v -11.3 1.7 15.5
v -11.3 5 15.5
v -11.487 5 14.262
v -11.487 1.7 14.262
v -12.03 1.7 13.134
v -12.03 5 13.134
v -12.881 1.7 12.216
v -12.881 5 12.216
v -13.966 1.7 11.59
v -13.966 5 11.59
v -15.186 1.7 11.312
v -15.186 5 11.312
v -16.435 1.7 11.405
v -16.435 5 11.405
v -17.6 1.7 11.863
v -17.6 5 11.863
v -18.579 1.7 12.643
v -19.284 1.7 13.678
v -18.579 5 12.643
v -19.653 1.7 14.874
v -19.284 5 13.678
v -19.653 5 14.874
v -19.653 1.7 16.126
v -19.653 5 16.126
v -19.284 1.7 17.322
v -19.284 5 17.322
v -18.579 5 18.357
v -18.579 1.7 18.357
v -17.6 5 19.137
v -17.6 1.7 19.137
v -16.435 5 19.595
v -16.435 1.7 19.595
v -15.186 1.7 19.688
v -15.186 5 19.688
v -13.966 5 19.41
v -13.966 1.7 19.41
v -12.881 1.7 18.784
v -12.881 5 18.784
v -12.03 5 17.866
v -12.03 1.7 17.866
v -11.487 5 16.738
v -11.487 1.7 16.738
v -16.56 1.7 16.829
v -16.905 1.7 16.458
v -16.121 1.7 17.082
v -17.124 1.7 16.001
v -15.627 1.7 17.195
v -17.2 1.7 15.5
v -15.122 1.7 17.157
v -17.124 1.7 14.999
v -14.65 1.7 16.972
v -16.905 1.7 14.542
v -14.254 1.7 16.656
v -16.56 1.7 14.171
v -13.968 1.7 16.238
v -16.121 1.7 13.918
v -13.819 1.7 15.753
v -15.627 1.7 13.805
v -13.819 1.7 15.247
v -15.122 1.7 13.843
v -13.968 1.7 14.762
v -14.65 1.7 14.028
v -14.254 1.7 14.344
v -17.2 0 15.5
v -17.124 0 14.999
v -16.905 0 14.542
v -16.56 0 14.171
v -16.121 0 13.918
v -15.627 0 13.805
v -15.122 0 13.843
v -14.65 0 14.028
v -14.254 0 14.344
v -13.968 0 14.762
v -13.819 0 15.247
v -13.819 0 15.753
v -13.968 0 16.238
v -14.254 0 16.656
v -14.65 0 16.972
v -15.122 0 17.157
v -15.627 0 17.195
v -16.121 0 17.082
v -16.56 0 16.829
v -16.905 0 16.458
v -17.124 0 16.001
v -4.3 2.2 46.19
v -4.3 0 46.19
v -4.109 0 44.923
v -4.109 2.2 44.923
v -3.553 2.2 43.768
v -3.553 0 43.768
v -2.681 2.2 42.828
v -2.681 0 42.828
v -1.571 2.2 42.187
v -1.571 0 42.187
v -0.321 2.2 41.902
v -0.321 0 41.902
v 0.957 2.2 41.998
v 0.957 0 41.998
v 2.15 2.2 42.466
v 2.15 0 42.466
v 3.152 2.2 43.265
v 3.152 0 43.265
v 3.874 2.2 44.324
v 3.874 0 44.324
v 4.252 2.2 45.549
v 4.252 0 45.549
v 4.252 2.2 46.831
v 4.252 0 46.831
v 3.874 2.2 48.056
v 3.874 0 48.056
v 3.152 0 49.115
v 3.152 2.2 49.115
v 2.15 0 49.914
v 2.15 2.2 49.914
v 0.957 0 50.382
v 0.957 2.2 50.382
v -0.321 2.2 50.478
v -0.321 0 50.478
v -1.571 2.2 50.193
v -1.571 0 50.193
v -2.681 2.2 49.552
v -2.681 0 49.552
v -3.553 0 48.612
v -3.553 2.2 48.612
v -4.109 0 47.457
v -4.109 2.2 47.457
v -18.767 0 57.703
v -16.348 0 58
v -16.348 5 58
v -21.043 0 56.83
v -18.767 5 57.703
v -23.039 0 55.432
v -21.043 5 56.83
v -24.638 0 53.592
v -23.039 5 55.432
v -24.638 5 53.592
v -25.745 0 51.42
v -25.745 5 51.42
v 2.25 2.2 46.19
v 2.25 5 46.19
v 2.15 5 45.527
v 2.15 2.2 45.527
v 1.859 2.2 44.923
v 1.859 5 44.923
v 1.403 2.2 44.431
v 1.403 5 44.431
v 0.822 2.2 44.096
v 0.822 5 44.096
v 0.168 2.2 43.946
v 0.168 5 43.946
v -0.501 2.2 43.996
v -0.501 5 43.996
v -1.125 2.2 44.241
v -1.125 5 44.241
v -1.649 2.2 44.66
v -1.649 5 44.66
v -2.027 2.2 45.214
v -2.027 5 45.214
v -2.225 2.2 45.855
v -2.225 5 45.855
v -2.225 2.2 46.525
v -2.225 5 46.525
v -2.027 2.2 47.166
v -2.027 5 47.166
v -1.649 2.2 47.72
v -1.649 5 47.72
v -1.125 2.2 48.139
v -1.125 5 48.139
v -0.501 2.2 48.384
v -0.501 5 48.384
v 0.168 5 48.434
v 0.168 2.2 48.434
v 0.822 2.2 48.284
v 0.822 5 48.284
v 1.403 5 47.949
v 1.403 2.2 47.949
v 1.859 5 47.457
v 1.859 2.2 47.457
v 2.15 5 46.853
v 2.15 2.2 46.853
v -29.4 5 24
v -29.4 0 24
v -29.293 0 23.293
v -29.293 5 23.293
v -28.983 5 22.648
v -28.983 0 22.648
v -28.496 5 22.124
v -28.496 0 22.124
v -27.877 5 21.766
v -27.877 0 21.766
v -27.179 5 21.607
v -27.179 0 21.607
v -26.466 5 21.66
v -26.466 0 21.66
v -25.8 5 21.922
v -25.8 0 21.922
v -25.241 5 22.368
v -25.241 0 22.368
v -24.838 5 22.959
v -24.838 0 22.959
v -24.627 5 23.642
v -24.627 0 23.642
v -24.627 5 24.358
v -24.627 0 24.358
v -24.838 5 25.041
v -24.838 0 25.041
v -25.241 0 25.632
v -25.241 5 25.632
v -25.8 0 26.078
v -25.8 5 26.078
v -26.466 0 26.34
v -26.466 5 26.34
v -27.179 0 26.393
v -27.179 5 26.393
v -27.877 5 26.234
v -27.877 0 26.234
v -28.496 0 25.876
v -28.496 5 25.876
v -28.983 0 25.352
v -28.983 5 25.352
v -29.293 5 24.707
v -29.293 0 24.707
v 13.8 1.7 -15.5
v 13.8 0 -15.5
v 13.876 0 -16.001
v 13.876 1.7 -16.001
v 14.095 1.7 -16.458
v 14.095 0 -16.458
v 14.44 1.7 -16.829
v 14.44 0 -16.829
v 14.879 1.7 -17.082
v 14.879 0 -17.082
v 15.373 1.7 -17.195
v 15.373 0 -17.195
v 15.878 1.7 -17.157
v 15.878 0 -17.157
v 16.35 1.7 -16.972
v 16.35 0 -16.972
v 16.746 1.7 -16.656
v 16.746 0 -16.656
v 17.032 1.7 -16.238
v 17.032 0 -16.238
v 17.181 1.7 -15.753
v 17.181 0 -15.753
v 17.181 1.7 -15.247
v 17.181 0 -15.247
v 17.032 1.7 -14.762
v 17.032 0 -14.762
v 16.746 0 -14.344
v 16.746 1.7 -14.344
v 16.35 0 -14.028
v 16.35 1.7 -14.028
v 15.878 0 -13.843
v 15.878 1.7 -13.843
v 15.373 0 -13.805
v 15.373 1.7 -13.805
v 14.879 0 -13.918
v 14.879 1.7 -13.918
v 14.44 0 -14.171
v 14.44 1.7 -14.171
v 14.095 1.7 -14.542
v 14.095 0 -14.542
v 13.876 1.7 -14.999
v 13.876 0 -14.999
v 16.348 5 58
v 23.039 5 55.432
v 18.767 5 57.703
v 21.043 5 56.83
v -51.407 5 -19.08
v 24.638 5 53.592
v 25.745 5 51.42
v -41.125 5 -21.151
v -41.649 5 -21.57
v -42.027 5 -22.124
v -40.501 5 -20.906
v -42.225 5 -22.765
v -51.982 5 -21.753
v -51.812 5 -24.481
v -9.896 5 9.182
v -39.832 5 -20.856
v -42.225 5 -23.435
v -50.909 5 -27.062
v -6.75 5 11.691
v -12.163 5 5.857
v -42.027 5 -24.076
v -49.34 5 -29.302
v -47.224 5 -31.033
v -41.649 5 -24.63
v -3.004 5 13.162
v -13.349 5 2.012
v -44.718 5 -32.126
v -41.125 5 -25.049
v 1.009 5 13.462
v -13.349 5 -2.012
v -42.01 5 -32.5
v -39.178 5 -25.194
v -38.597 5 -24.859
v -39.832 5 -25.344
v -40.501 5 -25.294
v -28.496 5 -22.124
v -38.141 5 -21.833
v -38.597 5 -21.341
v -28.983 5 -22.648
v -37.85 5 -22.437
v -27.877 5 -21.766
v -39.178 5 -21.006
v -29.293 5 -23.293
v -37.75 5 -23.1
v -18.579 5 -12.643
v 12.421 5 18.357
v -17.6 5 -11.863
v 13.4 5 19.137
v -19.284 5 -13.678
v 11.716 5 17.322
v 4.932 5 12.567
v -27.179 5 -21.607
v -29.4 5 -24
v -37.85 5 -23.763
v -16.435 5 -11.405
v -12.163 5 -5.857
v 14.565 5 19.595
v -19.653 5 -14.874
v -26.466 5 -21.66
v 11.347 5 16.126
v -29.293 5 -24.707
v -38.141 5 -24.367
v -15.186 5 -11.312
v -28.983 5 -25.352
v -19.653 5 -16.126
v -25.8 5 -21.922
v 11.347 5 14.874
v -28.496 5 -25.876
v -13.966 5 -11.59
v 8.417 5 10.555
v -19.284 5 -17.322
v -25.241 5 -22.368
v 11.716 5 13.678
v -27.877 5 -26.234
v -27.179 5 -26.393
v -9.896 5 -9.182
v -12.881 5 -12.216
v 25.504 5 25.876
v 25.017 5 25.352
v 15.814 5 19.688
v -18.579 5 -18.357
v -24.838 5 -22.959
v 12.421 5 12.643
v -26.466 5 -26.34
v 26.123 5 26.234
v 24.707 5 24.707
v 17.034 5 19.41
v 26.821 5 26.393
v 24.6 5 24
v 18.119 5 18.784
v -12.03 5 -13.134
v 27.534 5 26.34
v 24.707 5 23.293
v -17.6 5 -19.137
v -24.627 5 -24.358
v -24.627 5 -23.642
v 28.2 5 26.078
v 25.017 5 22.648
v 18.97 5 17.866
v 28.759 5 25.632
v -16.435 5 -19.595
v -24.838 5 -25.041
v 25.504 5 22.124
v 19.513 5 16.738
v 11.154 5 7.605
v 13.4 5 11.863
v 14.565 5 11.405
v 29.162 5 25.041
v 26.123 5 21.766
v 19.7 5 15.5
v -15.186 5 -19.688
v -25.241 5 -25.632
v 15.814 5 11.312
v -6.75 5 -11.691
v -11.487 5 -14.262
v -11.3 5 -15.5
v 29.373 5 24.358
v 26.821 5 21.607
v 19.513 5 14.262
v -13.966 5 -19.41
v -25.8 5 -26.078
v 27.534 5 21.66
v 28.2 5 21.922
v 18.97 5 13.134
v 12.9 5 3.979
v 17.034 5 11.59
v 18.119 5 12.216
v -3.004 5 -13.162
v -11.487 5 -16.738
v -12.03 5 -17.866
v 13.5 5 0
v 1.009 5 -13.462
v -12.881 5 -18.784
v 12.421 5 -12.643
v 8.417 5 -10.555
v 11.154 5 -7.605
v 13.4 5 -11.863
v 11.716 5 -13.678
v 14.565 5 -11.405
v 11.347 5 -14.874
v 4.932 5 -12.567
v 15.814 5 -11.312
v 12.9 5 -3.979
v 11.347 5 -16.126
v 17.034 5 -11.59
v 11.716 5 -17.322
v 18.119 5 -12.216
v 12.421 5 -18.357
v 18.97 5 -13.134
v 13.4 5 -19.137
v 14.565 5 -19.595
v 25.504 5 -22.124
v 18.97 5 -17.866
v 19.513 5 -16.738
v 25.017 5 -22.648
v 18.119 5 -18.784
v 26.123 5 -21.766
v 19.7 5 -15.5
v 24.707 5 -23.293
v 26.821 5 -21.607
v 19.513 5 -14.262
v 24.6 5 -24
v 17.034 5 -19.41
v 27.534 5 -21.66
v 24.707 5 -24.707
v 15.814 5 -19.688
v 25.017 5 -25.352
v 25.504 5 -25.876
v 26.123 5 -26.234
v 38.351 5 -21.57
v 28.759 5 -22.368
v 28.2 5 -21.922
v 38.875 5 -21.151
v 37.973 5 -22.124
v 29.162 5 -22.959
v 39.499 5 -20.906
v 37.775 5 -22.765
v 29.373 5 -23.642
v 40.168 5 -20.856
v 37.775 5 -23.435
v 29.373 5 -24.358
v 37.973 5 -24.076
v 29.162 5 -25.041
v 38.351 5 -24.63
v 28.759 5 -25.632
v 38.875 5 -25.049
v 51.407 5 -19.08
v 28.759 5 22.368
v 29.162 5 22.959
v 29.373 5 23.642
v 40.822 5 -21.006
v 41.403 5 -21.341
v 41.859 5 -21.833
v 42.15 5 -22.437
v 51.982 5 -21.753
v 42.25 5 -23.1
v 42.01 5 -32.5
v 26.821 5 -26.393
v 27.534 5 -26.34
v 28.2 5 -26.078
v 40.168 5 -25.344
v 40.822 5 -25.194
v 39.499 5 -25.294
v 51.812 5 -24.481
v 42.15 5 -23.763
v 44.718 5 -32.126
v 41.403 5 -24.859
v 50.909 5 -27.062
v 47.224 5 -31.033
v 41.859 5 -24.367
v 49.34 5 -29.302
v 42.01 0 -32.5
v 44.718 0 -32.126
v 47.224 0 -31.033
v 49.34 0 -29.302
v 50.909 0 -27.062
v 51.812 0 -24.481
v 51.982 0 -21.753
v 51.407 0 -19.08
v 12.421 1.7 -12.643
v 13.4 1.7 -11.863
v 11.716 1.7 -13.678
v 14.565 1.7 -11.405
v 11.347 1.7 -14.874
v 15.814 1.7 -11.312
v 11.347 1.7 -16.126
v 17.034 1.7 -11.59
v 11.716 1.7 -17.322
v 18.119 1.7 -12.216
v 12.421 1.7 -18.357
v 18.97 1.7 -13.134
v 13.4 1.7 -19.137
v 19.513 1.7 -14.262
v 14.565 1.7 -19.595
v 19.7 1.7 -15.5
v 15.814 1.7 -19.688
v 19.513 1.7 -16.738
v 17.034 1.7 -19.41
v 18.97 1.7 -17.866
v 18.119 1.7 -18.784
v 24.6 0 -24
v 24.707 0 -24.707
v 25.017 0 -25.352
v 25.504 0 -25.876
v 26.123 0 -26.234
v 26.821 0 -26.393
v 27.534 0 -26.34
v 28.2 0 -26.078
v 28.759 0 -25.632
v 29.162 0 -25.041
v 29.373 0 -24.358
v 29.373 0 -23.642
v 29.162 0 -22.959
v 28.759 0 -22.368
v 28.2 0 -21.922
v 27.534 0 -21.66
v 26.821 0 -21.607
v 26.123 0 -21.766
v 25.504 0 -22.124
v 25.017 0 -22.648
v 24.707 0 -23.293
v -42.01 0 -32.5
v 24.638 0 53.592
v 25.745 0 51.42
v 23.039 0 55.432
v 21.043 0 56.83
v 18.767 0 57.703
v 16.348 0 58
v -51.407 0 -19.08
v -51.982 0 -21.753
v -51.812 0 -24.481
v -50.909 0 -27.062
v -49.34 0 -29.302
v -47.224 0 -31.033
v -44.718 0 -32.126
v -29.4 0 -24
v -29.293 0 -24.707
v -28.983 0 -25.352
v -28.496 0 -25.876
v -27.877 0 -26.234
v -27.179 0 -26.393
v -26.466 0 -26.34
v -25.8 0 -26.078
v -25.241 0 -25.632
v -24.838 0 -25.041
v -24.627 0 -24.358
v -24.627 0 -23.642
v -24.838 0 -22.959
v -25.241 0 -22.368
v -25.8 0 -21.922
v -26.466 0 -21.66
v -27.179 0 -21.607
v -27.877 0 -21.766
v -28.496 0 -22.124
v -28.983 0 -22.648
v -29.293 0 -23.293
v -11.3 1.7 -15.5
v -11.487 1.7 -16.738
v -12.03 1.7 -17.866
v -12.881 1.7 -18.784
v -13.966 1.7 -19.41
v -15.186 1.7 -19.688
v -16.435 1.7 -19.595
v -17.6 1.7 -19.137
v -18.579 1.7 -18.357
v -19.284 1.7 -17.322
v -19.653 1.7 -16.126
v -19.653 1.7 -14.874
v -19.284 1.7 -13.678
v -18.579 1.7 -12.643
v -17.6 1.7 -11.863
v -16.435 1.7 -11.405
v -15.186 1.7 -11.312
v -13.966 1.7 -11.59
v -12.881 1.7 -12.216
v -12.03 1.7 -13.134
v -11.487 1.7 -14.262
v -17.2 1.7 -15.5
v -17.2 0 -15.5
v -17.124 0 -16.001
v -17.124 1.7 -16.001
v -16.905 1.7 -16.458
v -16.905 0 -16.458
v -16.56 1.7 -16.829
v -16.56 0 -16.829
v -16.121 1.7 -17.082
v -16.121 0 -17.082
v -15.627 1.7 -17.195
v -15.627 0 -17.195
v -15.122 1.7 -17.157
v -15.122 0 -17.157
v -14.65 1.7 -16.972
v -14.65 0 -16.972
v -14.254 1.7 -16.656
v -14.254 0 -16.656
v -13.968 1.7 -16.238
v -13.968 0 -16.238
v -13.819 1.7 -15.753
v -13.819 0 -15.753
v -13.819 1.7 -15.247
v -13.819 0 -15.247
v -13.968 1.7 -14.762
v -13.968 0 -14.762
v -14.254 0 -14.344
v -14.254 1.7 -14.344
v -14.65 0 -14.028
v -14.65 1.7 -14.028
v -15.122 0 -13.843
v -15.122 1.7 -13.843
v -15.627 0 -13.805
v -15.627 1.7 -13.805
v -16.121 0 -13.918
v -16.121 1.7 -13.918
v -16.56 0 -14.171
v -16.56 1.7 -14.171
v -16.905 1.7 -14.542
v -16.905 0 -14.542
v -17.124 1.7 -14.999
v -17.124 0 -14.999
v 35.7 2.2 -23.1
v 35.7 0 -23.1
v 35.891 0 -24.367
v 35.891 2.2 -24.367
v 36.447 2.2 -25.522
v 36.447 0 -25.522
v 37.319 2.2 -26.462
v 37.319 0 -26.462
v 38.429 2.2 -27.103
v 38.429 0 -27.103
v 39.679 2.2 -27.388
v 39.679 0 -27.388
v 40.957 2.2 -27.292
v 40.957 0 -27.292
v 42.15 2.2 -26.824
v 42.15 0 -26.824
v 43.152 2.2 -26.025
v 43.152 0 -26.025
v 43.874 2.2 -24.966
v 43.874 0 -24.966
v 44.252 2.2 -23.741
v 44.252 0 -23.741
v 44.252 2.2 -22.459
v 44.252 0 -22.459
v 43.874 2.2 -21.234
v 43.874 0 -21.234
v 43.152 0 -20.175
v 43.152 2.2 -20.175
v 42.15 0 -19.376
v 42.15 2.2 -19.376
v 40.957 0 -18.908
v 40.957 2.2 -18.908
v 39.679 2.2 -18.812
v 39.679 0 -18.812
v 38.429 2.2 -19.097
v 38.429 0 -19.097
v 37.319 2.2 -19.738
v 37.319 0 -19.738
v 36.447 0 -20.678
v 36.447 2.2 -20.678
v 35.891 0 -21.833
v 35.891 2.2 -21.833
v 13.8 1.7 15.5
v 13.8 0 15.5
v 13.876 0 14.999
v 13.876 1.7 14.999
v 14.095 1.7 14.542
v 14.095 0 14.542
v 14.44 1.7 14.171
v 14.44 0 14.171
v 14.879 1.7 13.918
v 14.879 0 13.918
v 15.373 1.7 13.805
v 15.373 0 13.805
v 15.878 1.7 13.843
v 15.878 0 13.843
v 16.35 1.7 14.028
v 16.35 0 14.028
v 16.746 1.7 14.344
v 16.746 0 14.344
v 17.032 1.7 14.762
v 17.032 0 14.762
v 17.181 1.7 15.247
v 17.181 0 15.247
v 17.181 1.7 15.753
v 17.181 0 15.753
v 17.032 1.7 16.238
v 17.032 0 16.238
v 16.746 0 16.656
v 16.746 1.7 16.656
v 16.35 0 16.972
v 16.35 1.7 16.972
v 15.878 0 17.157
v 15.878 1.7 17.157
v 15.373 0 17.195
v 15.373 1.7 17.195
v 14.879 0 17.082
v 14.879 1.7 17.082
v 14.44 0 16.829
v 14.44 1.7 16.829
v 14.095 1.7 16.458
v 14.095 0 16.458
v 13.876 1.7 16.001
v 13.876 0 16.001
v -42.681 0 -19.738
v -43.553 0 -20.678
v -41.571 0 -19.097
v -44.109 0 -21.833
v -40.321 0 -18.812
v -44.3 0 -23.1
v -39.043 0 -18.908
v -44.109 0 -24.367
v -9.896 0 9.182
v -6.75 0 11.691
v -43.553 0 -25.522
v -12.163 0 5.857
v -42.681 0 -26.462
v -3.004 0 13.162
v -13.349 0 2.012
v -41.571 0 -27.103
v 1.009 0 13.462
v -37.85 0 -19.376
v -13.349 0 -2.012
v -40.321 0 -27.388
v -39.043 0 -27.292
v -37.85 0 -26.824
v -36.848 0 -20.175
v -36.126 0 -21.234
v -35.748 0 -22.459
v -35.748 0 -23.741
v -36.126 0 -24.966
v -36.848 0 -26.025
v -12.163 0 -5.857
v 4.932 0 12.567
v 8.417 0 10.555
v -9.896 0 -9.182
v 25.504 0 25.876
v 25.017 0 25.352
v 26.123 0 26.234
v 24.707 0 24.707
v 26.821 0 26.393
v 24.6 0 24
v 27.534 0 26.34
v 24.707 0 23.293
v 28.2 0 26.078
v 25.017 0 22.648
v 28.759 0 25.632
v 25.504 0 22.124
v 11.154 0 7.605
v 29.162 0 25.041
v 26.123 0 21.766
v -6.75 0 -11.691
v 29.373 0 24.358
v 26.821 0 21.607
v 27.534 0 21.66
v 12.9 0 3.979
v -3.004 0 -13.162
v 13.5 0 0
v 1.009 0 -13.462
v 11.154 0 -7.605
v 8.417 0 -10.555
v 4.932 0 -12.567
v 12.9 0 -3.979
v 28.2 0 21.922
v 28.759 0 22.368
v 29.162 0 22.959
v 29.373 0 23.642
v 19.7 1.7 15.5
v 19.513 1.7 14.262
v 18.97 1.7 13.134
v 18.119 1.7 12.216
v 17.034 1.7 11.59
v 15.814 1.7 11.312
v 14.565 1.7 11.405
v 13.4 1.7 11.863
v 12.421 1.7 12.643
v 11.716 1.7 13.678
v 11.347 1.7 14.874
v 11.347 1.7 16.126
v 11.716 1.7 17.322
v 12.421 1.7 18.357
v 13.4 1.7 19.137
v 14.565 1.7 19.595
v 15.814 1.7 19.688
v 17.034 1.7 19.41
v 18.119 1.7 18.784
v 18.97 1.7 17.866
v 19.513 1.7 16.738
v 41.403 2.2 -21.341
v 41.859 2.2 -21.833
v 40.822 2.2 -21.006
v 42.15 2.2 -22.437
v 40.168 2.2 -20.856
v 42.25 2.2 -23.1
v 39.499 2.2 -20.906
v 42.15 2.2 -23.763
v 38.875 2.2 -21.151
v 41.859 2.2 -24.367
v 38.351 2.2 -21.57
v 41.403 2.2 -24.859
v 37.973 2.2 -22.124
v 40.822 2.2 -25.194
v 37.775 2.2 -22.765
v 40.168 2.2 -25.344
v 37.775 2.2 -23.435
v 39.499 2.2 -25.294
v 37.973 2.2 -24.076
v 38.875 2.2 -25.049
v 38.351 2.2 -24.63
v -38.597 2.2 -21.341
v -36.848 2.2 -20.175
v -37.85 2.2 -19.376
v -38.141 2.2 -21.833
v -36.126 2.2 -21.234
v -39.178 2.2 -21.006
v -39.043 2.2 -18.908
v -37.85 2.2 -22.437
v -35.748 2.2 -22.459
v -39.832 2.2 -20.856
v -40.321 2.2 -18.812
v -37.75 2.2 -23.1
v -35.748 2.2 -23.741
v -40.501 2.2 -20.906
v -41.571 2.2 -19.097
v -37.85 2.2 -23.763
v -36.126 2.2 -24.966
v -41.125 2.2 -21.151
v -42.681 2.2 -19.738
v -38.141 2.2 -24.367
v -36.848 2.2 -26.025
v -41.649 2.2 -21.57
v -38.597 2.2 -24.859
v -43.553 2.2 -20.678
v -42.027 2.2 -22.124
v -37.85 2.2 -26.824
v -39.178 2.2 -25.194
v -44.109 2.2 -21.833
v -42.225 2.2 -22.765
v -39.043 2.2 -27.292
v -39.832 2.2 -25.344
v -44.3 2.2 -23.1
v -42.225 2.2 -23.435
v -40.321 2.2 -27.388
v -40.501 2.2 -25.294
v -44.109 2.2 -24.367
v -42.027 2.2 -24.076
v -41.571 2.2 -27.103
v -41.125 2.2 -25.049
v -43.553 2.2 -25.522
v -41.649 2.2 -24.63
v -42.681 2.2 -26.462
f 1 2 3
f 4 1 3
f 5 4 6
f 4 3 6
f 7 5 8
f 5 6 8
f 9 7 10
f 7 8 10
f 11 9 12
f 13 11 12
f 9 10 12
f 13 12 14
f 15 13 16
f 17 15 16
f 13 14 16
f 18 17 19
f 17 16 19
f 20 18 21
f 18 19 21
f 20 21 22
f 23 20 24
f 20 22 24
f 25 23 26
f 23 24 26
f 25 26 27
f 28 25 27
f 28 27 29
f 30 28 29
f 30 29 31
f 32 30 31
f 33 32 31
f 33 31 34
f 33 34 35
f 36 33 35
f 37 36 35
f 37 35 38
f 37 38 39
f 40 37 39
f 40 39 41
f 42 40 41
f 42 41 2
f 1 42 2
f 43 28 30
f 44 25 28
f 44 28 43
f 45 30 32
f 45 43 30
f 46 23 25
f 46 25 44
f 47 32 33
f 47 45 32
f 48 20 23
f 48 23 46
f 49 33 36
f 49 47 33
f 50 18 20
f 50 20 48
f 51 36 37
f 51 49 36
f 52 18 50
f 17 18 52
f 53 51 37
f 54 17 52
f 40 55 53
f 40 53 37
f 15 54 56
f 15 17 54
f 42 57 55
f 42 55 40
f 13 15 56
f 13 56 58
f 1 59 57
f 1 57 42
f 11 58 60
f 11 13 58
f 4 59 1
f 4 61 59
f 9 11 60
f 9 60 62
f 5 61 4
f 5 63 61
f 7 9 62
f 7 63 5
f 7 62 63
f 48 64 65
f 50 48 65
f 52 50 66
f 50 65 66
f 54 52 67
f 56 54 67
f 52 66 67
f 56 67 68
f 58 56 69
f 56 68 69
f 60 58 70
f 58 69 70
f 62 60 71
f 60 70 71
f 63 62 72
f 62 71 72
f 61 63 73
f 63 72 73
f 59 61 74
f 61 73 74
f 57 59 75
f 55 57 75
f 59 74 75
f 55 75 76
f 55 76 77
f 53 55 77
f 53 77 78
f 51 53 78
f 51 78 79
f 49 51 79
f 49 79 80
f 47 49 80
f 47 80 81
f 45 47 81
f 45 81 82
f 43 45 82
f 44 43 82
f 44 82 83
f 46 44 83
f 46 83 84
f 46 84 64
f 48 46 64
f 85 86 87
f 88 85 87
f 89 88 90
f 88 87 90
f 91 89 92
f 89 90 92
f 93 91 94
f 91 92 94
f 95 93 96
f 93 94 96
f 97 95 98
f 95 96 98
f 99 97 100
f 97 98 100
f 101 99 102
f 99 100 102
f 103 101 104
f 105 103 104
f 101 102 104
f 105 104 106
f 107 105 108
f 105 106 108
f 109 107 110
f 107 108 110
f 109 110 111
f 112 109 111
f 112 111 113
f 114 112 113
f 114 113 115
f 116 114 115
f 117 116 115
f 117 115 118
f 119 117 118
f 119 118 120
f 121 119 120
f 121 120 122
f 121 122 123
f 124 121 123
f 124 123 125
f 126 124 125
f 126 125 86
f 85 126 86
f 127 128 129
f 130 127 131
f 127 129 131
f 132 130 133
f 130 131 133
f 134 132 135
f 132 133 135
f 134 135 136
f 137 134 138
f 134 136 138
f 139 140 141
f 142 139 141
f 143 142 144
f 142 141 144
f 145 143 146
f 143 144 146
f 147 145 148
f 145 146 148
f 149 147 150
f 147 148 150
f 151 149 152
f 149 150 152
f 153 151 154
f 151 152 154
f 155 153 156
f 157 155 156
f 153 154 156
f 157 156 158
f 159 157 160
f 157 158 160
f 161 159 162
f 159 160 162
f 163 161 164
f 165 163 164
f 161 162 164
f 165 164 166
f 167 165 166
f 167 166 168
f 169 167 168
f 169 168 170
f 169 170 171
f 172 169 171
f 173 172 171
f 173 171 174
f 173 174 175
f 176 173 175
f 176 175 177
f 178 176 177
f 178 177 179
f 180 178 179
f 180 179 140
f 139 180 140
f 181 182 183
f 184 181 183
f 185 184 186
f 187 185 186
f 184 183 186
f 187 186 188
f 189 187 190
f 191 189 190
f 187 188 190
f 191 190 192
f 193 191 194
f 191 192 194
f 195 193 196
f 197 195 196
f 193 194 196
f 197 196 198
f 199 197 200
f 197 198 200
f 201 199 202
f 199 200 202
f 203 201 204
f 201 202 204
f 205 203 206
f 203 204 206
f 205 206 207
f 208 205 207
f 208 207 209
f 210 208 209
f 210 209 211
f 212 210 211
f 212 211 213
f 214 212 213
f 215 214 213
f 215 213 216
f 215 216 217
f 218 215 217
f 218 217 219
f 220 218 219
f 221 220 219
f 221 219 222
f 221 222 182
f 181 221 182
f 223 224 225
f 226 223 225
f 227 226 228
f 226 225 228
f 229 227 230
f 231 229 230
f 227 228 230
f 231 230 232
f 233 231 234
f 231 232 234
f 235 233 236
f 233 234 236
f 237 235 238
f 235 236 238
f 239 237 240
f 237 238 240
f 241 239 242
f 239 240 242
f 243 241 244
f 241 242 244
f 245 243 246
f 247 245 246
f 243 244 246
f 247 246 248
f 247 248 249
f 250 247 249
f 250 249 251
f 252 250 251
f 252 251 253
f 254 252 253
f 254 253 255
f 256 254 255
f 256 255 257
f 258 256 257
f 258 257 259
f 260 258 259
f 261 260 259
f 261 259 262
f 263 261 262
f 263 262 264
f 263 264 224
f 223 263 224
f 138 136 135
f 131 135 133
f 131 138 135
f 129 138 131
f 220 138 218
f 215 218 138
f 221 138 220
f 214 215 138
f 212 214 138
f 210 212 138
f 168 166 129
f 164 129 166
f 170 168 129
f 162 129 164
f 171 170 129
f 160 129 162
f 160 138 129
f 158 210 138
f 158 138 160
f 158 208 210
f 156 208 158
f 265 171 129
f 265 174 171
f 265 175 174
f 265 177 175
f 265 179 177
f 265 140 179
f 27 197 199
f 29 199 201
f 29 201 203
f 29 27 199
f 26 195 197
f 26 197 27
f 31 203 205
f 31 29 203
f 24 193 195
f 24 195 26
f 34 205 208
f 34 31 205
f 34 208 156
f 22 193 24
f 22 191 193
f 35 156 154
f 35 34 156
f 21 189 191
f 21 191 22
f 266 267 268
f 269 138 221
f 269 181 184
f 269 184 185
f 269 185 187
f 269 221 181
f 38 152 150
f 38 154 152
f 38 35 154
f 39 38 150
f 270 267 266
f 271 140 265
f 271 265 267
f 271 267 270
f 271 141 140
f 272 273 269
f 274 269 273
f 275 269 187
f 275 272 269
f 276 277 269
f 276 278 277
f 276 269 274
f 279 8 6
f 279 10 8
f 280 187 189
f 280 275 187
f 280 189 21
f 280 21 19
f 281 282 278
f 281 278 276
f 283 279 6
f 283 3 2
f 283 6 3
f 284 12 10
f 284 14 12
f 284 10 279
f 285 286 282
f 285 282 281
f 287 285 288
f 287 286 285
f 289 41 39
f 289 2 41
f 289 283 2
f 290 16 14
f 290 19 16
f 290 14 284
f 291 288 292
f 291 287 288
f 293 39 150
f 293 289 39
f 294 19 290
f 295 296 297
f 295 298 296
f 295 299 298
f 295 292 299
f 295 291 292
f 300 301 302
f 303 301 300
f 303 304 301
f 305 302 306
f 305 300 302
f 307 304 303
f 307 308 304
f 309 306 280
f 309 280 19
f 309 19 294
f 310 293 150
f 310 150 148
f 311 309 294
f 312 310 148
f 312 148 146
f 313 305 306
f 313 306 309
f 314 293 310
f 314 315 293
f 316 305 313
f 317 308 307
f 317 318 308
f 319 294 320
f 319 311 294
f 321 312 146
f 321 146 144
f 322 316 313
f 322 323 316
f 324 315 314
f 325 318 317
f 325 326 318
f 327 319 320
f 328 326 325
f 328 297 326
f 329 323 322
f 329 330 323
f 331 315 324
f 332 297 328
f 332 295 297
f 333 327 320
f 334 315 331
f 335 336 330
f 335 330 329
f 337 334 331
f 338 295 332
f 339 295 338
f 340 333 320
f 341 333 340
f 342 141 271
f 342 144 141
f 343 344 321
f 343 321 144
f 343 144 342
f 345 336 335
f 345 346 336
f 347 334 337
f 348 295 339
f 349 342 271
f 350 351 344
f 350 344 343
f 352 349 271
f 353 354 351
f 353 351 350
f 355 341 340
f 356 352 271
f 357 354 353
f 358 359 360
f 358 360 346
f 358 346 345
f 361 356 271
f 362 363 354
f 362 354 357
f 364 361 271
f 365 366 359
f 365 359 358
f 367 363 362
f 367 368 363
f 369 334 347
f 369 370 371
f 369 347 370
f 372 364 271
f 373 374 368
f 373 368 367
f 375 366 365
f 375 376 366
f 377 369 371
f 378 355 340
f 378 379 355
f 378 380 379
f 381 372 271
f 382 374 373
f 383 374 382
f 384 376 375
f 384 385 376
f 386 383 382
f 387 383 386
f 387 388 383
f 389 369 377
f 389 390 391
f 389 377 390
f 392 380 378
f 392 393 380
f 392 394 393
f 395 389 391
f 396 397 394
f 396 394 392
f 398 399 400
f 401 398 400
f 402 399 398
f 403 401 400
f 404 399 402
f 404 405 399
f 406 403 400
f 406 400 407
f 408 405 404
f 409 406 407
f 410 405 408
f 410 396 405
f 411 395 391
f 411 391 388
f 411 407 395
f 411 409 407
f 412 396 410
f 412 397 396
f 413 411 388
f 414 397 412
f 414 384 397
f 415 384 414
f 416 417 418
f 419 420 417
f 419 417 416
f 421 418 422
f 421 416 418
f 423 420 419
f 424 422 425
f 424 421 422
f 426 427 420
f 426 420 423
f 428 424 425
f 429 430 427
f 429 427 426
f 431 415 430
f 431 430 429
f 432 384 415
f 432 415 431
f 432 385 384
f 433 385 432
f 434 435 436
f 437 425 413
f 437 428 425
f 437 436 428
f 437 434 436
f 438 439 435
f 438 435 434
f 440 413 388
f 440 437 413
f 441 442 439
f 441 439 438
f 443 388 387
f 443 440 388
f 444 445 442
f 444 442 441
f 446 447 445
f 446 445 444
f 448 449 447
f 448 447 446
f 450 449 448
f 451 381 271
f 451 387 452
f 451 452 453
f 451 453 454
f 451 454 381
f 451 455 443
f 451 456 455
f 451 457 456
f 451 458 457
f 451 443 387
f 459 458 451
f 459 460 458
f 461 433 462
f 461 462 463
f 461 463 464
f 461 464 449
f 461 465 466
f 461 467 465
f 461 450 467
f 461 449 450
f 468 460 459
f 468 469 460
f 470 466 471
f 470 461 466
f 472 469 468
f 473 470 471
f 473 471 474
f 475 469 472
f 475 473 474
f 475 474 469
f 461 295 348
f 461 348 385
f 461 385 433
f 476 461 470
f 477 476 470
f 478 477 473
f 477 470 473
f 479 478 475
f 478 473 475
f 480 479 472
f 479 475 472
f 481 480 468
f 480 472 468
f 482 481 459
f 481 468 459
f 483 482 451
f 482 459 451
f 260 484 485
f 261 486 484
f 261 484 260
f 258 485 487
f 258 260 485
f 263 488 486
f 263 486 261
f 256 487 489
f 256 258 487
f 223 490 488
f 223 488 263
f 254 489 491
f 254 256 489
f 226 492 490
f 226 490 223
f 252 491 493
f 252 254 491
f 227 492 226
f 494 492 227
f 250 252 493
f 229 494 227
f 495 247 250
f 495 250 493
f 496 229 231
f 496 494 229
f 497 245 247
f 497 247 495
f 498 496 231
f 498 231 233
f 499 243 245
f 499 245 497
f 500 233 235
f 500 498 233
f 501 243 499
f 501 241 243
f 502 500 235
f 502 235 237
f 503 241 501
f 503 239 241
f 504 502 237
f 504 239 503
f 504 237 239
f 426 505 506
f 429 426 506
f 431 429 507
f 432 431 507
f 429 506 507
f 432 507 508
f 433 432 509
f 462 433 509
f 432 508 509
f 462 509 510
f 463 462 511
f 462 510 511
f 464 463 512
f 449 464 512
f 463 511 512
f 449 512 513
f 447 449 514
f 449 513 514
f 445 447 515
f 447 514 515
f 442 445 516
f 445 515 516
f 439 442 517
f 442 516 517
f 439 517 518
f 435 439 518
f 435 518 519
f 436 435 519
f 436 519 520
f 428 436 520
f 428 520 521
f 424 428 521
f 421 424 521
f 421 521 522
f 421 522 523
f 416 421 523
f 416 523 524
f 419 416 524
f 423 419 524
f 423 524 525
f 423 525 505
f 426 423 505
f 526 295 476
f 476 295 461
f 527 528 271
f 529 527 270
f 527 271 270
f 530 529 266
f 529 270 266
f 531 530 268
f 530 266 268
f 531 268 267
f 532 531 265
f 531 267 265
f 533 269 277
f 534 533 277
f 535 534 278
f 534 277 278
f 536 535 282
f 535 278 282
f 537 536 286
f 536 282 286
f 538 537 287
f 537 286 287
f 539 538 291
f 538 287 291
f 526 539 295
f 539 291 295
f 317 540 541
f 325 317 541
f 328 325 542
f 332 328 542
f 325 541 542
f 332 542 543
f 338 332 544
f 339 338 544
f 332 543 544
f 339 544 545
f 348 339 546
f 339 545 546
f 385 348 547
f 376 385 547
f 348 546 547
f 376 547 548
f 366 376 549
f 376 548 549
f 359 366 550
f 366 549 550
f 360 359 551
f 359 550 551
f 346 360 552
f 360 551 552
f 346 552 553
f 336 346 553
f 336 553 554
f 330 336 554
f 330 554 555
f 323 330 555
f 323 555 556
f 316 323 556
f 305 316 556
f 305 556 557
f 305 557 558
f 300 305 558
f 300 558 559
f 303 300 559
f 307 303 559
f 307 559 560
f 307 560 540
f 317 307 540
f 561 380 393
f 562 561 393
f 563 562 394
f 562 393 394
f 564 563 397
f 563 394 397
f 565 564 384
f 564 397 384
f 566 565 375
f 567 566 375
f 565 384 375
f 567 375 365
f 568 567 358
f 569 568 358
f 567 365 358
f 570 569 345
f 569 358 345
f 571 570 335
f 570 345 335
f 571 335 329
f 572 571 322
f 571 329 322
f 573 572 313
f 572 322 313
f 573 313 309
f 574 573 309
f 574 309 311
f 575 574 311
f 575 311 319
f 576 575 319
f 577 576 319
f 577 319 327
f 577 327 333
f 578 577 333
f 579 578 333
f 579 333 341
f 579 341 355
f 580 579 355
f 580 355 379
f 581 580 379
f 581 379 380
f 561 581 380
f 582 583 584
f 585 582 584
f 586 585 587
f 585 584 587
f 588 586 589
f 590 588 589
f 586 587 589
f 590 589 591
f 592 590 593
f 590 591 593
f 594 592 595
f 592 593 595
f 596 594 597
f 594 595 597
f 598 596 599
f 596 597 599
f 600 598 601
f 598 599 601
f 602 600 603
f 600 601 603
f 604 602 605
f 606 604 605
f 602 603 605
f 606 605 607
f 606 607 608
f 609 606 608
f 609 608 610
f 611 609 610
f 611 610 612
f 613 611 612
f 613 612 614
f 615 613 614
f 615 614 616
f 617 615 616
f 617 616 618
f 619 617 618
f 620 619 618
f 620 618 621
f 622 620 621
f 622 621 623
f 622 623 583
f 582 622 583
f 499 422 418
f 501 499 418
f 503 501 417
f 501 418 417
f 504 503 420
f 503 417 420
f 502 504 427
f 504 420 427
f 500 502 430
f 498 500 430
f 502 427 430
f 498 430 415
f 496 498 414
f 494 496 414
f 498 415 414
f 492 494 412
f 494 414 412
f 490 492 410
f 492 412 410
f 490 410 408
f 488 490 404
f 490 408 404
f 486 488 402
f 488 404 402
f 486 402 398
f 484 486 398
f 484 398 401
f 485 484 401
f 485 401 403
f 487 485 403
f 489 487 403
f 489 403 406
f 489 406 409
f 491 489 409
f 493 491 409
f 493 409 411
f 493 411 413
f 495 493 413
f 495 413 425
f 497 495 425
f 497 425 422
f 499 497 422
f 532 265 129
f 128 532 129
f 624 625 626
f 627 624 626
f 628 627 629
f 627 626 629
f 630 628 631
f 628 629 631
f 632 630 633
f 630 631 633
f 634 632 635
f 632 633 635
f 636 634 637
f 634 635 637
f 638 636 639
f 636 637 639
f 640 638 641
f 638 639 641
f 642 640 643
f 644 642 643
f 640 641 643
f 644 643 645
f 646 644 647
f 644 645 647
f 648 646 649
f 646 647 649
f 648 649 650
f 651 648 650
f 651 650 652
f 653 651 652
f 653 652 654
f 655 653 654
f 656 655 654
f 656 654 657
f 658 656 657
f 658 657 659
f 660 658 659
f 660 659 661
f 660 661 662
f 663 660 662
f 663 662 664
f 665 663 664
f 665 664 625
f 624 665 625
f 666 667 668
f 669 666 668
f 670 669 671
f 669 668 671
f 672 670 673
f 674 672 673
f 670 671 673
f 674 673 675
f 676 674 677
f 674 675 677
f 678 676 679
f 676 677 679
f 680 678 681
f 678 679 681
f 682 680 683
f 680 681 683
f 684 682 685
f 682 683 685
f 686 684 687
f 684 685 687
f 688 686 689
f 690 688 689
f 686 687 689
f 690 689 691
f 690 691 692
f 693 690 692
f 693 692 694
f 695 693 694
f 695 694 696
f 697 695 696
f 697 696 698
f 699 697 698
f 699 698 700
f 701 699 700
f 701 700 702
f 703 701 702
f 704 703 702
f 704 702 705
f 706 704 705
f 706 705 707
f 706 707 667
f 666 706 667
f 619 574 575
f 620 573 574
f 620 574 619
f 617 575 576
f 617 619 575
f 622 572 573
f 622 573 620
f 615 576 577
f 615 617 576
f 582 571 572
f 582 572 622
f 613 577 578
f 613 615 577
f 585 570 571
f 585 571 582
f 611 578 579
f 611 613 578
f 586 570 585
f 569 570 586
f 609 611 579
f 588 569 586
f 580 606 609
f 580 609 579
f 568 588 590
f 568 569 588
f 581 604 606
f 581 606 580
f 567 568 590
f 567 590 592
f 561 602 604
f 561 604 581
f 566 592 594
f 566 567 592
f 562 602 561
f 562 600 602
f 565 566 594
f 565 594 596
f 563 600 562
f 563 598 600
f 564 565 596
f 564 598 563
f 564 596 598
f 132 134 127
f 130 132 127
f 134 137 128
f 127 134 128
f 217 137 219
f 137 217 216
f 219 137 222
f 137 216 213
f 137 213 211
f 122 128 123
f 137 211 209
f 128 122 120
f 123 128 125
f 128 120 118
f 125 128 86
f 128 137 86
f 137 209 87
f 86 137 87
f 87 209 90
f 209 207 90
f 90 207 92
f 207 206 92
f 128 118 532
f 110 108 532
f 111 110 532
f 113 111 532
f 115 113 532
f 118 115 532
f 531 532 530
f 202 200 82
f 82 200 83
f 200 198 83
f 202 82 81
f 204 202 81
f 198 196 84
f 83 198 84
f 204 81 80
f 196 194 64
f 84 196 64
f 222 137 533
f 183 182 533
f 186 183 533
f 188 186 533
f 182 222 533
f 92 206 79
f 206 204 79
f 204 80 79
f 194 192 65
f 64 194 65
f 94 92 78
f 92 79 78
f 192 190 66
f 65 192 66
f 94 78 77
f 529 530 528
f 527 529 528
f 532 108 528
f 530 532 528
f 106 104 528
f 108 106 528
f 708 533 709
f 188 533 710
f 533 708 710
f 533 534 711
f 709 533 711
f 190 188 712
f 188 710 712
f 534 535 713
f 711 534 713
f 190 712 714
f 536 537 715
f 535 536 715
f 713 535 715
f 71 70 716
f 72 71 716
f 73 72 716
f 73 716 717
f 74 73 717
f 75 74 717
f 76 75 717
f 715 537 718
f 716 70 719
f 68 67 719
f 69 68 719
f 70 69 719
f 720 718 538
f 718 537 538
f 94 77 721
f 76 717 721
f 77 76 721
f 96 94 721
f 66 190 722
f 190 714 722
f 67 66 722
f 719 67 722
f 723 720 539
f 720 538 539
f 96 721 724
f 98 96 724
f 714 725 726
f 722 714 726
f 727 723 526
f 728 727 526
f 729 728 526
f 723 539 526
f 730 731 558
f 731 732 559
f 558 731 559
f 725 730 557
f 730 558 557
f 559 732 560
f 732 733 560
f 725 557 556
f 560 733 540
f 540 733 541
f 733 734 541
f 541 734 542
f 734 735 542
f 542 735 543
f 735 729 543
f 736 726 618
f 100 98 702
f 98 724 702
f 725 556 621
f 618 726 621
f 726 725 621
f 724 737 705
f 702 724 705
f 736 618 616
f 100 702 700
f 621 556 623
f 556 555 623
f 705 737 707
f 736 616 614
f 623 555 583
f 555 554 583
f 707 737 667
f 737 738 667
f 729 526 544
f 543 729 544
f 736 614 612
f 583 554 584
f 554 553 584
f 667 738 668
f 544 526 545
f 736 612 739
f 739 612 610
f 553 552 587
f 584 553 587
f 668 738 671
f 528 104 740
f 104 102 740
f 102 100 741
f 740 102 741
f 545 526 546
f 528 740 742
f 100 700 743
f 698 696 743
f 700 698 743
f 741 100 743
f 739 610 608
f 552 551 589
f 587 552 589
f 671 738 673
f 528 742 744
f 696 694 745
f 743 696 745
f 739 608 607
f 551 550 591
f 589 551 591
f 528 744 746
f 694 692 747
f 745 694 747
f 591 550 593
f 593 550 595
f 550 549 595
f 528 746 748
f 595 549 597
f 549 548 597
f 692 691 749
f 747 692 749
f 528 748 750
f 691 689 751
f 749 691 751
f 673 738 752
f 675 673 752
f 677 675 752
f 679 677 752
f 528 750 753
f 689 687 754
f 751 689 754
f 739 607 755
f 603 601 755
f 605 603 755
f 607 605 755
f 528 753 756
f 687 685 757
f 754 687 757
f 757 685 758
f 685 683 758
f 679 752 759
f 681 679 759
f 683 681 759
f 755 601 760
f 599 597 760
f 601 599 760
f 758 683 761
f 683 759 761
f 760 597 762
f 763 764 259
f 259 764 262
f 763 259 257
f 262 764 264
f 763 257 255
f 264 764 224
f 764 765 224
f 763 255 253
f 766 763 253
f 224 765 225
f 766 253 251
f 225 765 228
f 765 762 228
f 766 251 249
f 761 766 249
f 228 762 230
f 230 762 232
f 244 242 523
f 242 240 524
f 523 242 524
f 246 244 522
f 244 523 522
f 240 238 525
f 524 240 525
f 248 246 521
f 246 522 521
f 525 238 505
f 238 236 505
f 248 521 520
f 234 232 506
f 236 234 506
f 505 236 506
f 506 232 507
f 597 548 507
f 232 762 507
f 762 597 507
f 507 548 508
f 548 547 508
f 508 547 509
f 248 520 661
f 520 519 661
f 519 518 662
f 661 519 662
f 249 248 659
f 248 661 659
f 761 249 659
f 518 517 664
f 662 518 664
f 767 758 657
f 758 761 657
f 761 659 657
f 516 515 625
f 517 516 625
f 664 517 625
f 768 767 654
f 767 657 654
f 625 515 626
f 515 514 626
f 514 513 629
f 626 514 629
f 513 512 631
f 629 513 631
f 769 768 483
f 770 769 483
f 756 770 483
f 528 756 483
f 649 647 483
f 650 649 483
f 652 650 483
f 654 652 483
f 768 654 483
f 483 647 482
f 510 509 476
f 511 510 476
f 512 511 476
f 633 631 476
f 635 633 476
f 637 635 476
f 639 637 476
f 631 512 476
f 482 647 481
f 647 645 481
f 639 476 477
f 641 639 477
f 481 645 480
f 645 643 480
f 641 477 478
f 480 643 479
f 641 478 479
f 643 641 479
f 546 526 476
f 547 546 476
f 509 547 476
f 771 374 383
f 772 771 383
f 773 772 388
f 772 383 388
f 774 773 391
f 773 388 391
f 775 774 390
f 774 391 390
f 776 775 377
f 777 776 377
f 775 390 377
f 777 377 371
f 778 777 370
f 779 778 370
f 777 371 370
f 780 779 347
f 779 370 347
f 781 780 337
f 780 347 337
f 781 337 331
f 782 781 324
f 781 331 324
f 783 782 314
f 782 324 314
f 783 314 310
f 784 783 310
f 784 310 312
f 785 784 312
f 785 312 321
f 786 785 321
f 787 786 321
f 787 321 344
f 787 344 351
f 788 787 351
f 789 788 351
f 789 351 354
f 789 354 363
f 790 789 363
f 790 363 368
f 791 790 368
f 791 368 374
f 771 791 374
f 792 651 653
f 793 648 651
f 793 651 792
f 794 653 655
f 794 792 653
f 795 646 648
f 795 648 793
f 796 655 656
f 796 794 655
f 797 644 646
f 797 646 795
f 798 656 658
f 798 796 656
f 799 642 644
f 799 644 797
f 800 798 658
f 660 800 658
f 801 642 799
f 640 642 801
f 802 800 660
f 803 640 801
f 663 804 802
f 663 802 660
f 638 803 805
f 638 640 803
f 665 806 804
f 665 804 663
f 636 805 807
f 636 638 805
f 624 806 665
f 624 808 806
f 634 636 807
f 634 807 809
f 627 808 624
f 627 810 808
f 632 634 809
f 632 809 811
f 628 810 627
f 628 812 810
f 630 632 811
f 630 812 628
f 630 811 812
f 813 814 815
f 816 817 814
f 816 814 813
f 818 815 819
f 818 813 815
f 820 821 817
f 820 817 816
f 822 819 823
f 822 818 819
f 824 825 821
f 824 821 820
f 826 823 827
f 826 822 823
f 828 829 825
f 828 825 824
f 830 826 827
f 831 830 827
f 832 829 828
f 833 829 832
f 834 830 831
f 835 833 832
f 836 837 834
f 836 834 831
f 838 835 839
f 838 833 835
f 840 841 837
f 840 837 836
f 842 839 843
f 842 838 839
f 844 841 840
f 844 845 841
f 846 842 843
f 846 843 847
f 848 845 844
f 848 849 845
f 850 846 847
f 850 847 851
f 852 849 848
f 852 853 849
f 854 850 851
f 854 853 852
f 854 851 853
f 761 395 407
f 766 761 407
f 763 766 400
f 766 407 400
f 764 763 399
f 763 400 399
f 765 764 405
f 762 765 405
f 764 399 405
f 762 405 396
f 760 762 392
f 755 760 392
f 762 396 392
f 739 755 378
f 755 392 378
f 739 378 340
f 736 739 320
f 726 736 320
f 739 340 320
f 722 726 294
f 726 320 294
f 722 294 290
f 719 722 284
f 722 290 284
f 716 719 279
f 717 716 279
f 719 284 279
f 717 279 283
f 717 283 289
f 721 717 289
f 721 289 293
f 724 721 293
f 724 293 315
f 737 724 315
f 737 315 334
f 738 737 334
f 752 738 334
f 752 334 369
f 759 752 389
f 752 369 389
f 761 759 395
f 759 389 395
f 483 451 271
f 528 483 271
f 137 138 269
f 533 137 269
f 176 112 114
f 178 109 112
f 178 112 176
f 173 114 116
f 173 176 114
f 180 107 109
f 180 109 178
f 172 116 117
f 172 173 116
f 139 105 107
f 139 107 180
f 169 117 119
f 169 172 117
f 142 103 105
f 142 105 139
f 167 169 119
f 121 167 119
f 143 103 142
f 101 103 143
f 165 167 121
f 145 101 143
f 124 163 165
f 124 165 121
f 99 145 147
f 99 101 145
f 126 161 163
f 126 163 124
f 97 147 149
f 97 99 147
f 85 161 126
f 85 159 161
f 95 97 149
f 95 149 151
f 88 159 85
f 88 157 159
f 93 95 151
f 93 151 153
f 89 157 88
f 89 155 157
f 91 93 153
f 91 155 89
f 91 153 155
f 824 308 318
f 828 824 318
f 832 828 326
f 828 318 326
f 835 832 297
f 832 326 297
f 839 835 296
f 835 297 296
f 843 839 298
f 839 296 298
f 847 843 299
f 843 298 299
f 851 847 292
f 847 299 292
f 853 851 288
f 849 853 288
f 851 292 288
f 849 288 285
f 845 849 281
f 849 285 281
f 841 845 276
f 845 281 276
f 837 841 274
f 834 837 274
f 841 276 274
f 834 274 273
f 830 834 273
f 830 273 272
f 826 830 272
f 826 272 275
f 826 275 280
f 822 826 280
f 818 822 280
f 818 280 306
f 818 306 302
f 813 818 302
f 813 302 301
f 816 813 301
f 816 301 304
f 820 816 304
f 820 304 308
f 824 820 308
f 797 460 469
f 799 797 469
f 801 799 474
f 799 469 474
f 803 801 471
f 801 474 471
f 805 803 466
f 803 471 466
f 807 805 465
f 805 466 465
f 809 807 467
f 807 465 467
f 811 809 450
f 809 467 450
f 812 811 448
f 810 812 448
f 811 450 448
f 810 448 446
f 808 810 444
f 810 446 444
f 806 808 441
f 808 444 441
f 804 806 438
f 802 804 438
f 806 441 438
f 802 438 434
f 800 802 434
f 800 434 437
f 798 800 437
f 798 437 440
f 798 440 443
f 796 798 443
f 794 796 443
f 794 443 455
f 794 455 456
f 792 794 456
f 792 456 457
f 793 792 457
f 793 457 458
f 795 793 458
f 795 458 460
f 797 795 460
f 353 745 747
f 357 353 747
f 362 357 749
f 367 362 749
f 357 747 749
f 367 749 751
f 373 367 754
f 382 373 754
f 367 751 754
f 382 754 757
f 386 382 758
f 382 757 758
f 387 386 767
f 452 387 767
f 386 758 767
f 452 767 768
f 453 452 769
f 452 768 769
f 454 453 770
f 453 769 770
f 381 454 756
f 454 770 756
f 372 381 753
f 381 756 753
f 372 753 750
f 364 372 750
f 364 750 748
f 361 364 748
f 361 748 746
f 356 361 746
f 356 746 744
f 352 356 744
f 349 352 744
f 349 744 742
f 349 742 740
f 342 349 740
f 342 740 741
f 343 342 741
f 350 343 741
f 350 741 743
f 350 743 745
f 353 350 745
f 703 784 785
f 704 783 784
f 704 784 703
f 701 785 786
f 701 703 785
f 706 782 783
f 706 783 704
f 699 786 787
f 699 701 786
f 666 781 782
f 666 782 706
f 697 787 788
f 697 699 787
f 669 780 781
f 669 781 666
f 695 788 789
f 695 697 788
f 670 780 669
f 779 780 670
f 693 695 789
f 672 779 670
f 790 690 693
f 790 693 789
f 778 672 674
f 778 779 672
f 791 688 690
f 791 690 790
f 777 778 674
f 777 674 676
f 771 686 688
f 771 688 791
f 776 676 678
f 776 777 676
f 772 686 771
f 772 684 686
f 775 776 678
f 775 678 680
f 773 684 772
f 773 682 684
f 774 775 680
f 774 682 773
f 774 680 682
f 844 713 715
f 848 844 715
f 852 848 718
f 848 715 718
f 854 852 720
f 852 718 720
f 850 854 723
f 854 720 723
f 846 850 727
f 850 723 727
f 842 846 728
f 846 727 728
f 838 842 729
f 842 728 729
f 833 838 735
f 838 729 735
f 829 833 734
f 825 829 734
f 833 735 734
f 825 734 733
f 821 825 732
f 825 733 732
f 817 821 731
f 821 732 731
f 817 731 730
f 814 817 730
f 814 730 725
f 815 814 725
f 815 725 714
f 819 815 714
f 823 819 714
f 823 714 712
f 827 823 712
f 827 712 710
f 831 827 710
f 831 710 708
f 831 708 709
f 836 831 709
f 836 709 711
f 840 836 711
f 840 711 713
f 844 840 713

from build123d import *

# Parameters (mm, degrees)
SKETCH2_W                                        = 130
SKETCH2_H                                        = 130
BOSS_EXTRUDE1_DEPTH                              = 5
SKETCH3_R                                        = 13.5
CUT_EXTRUDE1_DEPTH                               = 5
SKETCH8_W                                        = 130
SKETCH8_H                                        = 130
CUT_EXTRUDE6_DEPTH                               = 6
M4_CLEARANCE_HOLE1_D                             = 4.8
M4_CLEARANCE_HOLE1_DEPTH                         = 5
CBORE_FOR_M3_HEX_HEAD_MACHINE_SCREW1_D           = 3.4
CBORE_FOR_M3_HEX_HEAD_MACHINE_SCREW1_DEPTH       = 5
CBORE_FOR_M3_HEX_HEAD_MACHINE_SCREW1_CBORE_D     = 8.4
CBORE_FOR_M3_HEX_HEAD_MACHINE_SCREW1_CBORE_DEPTH = 3.3
CBORE_FOR_M4_SBHCS1_D                            = 4.5
CBORE_FOR_M4_SBHCS1_DEPTH                        = 5
CBORE_FOR_M4_SBHCS1_CBORE_D                      = 8.6
CBORE_FOR_M4_SBHCS1_CBORE_DEPTH                  = 2.2


with BuildPart() as part:
    # Sketch2 → Boss-Extrude1 (new body)
    with BuildSketch(Plane(origin=(0, 0, 0), x_dir=(1, 0, 0), z_dir=(0, 1, 0))):
        Rectangle(SKETCH2_W, SKETCH2_H)
    extrude(amount=BOSS_EXTRUDE1_DEPTH)

    # Sketch3 → Cut-Extrude1 (cut)
    with BuildSketch(Plane(origin=(0, 5, 0), x_dir=(1, 0, 0), z_dir=(0, 1, 0))):
        Circle(SKETCH3_R)
    extrude(amount=-CUT_EXTRUDE1_DEPTH, mode=Mode.SUBTRACT)

    # Sketch8 → Cut-Extrude6 (cut, through all)
    with BuildSketch(Plane(origin=(0, 5, 0), x_dir=(1, 0, 0), z_dir=(0, 1, 0))):
        Rectangle(SKETCH8_W, SKETCH8_H)
        with BuildLine():
            Line((-42.00982343, 32.5), (42.00982343, 32.5))
            ThreePointArc((42.00982343, 32.5), (50.201409492, 28.235670649), (51.406671379, 19.079583559))
            Line((51.406671379, 19.079583559), (25.74494306, -51.420416441))
            ThreePointArc((25.74494306, -51.420416441), (22.083765761, -56.191586062), (16.348095112, -58))
            Line((16.348095112, -58), (-16.348095112, -58))
            ThreePointArc((-16.348095112, -58), (-22.083765761, -56.191586062), (-25.74494306, -51.420416441))
            Line((-25.74494306, -51.420416441), (-51.406671379, 19.079583559))
            ThreePointArc((-51.406671379, 19.079583559), (-50.201409492, 28.235670649), (-42.00982343, 32.5))
        make_face(mode=Mode.SUBTRACT)
    extrude(amount=-CUT_EXTRUDE6_DEPTH, mode=Mode.SUBTRACT)

    # M4 Clearance Hole1
    with Locations(Plane(origin=(0, 5, 0), x_dir=(1, 0, 0), z_dir=(0, 1, 0))):
        with Locations((-27, 24), (27, 24), (27, -24), (-27, -24)):
            Hole(M4_CLEARANCE_HOLE1_D / 2, depth=M4_CLEARANCE_HOLE1_DEPTH)

    # CBORE for M3 Hex Head Machine Screw1
    with Locations(Plane(origin=(0, 5, 0), x_dir=(1, 0, 0), z_dir=(0, 1, 0))):
        with Locations((-15.5, 15.5), (15.5, 15.5), (15.5, -15.5), (-15.5, -15.5)):
            CounterBoreHole(CBORE_FOR_M3_HEX_HEAD_MACHINE_SCREW1_D / 2, CBORE_FOR_M3_HEX_HEAD_MACHINE_SCREW1_CBORE_D / 2, CBORE_FOR_M3_HEX_HEAD_MACHINE_SCREW1_CBORE_DEPTH, depth=CBORE_FOR_M3_HEX_HEAD_MACHINE_SCREW1_DEPTH)

    # CBORE for M4 SBHCS1
    with Locations(Plane(origin=(0, 0, 0), x_dir=(-1, 0, 0), z_dir=(0, -1, 0))):
        with Locations((0, -46.19), (40, 23.1), (-40, 23.1)):
            CounterBoreHole(CBORE_FOR_M4_SBHCS1_D / 2, CBORE_FOR_M4_SBHCS1_CBORE_D / 2, CBORE_FOR_M4_SBHCS1_CBORE_DEPTH, depth=CBORE_FOR_M4_SBHCS1_DEPTH)


solid = part.part
